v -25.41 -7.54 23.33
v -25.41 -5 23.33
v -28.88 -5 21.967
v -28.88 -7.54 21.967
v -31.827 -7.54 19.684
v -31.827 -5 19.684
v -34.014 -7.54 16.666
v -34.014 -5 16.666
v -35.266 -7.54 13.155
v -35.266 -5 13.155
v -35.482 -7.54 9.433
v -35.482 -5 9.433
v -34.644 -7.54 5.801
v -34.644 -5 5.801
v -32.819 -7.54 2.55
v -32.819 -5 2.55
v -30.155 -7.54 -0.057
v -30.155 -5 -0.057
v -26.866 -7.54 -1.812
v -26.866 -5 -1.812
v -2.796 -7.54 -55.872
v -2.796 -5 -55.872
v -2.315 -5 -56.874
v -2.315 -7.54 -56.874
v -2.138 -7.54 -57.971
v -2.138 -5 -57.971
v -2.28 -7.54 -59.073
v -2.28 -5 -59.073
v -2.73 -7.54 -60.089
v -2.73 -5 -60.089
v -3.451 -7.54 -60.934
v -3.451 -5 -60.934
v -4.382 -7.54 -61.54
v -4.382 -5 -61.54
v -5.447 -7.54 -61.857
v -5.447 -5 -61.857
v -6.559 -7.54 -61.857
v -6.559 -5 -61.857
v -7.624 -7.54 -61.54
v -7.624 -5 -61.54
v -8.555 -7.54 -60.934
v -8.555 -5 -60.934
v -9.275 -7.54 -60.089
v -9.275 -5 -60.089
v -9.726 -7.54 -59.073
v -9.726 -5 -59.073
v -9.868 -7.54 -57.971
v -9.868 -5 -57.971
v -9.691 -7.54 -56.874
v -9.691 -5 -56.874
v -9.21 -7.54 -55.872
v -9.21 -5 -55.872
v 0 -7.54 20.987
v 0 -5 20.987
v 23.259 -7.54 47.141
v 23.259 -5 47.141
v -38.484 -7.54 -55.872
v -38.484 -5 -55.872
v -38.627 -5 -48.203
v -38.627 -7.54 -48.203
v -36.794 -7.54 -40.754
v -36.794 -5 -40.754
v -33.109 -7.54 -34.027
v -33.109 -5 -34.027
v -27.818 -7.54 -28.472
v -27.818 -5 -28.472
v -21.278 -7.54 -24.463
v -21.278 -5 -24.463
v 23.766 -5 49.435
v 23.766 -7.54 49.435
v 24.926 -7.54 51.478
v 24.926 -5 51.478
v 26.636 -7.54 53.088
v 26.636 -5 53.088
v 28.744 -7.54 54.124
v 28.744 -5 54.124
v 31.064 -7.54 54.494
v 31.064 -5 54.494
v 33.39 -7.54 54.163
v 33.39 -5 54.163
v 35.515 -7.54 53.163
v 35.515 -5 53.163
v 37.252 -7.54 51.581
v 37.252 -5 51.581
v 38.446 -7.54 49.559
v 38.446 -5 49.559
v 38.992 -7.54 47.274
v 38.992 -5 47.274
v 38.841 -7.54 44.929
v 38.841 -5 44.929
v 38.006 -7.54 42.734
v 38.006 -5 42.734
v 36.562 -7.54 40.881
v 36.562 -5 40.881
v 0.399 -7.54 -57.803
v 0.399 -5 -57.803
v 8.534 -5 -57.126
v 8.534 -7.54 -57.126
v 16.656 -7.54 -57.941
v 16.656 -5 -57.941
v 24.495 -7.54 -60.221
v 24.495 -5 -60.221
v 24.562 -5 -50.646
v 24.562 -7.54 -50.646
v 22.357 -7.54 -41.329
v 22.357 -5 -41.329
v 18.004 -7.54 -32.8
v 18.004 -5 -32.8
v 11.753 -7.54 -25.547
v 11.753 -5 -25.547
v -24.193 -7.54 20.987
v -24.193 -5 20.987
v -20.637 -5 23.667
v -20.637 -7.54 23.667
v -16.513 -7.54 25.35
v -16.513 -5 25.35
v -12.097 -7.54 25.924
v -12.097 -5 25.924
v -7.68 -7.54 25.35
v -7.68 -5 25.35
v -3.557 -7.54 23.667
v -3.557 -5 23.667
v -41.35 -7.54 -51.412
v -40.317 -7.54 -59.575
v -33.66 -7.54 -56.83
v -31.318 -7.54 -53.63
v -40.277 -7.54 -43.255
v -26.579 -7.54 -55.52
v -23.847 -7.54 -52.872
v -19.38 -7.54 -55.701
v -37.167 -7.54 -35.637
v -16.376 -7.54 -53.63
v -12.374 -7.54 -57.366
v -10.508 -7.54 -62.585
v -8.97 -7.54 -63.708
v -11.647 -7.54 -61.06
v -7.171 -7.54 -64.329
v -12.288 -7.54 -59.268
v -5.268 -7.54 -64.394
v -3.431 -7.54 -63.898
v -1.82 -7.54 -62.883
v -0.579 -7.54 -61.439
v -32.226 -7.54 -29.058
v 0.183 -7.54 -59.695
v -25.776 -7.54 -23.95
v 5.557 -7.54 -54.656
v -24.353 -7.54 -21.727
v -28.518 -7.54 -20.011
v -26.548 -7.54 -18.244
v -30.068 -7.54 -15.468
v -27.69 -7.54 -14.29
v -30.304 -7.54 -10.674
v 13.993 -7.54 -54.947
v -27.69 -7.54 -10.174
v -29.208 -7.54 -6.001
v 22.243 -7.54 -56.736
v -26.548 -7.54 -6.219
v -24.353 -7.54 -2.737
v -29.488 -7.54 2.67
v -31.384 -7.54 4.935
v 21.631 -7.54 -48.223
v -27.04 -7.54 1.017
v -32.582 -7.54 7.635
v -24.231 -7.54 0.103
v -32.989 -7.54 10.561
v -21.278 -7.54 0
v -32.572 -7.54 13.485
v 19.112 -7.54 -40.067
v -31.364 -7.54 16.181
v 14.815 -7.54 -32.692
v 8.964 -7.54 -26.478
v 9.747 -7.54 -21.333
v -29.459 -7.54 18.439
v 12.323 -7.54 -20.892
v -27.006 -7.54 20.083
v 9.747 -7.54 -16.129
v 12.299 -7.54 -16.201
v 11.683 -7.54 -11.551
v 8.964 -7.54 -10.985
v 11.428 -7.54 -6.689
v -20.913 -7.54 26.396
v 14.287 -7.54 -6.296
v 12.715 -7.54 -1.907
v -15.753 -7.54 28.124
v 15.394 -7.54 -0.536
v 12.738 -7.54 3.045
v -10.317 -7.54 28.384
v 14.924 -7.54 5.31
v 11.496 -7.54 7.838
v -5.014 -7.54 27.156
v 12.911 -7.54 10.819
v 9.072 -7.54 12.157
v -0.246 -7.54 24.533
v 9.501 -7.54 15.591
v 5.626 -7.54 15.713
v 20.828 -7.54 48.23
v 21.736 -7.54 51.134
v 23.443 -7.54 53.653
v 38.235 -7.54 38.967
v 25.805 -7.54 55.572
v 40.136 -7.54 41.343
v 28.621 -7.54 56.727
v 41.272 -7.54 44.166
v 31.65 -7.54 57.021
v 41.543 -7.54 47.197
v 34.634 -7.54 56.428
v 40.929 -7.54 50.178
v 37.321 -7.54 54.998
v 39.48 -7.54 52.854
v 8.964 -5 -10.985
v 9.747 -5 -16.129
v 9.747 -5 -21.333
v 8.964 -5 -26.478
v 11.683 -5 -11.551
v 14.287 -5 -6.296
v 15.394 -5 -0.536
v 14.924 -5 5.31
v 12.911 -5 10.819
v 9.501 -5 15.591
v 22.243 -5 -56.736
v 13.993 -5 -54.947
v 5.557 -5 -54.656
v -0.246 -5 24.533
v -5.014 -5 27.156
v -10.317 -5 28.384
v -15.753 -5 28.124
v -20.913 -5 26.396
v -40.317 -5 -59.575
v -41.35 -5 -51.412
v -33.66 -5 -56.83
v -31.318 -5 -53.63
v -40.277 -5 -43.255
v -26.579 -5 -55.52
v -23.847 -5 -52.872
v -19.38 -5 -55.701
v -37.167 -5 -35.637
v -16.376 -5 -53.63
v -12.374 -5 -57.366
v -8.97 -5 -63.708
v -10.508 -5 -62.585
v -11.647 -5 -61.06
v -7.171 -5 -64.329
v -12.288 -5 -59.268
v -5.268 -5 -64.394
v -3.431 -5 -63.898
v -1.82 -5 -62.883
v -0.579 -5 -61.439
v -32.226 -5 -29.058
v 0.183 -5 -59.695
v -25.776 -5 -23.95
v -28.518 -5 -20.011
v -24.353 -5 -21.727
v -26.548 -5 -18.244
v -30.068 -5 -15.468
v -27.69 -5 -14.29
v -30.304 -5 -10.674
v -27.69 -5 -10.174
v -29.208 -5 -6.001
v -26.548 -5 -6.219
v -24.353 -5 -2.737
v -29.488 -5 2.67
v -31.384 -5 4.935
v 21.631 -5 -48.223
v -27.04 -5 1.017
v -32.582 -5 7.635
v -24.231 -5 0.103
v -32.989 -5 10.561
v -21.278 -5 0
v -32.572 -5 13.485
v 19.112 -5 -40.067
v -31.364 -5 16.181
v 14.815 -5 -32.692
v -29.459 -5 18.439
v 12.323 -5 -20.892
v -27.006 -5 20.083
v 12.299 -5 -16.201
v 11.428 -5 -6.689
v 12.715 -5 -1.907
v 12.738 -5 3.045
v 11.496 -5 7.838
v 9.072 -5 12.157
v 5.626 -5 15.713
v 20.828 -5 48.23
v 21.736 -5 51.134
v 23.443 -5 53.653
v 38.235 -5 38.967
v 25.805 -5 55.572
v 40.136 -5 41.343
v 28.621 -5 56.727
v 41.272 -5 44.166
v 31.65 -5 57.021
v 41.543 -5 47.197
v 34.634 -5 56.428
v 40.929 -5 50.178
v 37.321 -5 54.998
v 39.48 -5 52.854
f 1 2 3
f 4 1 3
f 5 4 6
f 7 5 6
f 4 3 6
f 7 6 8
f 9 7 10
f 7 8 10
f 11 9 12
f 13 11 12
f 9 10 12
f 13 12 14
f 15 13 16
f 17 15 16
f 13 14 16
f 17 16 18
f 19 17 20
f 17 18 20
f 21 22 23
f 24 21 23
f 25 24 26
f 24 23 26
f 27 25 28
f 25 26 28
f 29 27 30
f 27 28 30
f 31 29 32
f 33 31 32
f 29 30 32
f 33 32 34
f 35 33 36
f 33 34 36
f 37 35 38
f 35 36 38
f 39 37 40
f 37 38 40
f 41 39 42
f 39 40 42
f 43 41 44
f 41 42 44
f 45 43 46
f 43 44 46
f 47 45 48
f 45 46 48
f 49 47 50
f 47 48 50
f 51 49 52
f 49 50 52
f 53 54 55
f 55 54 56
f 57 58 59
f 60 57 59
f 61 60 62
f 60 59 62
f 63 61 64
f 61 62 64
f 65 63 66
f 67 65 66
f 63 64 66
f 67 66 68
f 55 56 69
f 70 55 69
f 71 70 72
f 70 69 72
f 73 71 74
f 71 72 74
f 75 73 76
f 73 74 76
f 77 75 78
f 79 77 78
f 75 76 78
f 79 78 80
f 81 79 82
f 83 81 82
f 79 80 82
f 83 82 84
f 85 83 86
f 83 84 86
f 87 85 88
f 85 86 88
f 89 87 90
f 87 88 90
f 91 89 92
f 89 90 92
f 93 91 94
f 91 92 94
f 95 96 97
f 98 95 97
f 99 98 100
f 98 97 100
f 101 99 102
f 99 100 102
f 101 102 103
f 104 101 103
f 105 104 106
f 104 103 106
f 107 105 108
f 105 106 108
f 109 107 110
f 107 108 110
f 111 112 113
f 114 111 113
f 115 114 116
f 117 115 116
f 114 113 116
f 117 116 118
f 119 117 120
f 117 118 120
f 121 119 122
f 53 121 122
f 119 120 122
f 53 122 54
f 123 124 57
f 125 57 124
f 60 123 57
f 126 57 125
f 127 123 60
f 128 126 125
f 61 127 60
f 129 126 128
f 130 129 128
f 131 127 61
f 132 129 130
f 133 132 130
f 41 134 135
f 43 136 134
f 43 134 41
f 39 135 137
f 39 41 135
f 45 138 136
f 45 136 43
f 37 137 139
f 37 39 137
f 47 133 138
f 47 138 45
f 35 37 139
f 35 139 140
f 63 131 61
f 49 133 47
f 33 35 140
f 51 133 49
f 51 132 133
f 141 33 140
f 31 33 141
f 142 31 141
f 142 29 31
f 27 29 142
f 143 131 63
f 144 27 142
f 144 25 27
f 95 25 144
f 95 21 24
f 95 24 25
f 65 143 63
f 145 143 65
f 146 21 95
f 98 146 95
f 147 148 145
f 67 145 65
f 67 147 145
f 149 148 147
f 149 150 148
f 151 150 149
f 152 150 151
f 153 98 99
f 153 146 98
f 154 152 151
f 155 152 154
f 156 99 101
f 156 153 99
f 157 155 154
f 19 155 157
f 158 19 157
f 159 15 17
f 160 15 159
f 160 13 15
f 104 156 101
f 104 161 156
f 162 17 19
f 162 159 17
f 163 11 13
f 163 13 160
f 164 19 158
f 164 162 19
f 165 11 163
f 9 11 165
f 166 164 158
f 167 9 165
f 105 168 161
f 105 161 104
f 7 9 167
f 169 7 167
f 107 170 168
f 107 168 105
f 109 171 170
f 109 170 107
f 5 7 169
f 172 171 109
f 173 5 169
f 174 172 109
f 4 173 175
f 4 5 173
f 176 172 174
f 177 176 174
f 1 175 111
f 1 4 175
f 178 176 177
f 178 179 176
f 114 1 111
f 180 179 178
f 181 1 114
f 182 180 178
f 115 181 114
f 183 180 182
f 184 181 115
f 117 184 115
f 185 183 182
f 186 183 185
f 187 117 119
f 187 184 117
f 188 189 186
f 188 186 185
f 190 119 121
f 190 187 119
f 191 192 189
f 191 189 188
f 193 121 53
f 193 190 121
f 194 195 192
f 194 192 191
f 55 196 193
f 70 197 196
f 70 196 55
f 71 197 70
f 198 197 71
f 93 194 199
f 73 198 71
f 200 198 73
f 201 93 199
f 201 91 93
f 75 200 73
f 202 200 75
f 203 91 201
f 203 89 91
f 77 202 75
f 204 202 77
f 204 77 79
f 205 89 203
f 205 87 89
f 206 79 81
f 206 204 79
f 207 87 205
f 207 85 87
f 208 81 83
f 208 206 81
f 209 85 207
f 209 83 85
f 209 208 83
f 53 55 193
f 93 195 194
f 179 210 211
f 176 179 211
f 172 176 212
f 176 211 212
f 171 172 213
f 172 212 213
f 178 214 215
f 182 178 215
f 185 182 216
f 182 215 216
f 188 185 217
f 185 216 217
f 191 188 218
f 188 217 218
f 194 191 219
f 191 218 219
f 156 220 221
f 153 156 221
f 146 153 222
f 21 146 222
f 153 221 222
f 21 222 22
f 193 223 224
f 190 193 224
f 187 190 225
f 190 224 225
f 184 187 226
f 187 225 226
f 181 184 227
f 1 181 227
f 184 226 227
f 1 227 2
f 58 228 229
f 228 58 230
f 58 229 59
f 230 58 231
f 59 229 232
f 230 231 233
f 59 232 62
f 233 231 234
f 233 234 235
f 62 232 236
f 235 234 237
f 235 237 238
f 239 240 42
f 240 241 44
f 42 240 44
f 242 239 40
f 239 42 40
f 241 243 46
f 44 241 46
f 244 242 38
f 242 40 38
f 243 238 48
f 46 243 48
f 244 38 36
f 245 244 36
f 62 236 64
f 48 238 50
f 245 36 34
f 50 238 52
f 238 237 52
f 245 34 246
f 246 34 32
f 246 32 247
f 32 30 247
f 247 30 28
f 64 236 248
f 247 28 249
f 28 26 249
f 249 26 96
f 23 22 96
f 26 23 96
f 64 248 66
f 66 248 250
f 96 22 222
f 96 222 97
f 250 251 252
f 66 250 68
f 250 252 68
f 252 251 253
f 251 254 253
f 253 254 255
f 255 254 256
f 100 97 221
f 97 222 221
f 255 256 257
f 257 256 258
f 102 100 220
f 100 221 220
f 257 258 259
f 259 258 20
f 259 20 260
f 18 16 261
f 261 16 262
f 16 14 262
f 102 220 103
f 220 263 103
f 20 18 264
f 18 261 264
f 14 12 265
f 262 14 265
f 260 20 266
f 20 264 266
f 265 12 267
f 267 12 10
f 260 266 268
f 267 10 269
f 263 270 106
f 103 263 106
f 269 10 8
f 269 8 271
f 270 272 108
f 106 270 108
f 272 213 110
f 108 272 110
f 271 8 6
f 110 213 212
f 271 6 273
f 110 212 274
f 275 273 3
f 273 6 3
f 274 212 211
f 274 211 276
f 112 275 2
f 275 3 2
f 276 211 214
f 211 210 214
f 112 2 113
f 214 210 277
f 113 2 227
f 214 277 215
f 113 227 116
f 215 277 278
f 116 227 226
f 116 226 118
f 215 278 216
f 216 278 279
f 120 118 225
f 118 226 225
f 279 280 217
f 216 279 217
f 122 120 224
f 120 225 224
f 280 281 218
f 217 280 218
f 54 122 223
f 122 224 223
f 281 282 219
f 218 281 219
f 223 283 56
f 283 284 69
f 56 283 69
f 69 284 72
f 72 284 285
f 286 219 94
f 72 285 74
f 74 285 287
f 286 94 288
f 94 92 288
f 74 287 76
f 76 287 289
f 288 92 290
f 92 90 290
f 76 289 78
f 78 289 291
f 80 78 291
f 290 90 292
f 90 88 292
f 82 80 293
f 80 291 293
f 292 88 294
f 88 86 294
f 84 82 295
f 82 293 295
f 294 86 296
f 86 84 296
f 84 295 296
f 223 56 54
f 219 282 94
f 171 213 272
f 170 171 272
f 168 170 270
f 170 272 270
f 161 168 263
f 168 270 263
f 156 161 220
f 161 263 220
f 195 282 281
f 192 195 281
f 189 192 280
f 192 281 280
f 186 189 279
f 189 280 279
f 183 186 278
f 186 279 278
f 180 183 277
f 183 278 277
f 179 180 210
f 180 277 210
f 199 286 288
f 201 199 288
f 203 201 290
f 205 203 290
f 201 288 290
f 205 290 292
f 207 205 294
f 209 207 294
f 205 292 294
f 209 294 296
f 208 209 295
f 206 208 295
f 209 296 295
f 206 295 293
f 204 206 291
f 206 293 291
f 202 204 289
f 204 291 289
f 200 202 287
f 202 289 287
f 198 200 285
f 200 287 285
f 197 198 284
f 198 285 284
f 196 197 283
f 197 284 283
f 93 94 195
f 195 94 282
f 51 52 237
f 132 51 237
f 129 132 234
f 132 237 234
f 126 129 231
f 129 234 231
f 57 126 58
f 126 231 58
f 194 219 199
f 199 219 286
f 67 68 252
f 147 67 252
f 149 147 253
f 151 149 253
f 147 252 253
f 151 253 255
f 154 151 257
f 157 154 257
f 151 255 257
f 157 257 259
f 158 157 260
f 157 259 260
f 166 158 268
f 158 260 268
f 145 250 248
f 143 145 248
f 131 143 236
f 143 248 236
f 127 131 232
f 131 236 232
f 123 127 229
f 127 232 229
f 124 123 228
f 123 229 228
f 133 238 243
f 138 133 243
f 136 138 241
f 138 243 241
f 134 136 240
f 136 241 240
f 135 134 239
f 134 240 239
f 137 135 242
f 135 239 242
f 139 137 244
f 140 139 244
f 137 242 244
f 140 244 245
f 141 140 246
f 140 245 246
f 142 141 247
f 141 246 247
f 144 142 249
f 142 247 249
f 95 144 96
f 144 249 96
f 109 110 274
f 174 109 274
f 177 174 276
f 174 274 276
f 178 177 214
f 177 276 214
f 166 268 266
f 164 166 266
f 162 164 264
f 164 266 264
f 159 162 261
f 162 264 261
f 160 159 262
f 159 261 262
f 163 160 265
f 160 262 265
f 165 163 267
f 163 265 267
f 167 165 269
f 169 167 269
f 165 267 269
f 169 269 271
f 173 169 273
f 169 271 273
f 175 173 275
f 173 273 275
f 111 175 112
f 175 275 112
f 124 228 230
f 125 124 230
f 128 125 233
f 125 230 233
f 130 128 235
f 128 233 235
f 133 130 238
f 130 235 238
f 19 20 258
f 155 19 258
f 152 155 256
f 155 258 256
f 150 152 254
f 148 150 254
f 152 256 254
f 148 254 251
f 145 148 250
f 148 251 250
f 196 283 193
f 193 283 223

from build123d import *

# Parameters (mm, degrees)
F1_DEPTH = 5
F4_DEPTH = 2.54
F5_DEPTH = 25.4


with BuildPart() as f1:
    # F0 (on Front) → F1 (new body)
    with BuildSketch(Plane.XZ):
        with BuildLine():
            ThreePointArc((0, 20.9869445181), (-12.0966427586, 25.9236544676), (-24.1932855172, 20.9869445181))
            ThreePointArc((-24.1932855172, 20.9869445181), (-32.8877742223, 9.0834832543), (-21.2784307494, 0))
            ThreePointArc((-21.2784307494, 0), (-27.8345018972, -12.2317448258), (-21.2784307494, -24.4634896517))
            ThreePointArc((-21.2784307494, -24.4634896517), (-35.1701421662, -37.2707710413), (-38.4840406477, -55.8724962175))
            ThreePointArc((-38.4840406477, -55.8724962175), (-23.8469055846, -52.8720513548), (-9.2097705214, -55.8724962175))
            ThreePointArc((-9.2097705214, -55.8724962175), (-6.0029489911, -61.8966557159), (-2.7961274609, -55.8724962175))
            ThreePointArc((-2.7961274609, -55.8724962175), (9.7817579313, -54.6124723986), (22.2429726273, -56.7359104753))
            ThreePointArc((22.2429726273, -56.7359104753), (22.2759376745, -54.9746026101), (22.22623583, -53.2136875591))
            ThreePointArc((22.22623583, -53.2136875591), (18.366243738, -38.4713383456), (8.9641526372, -26.4781285077))
            ThreePointArc((8.9641526372, -26.4781285077), (9.8457214763, -18.7313808571), (8.9641526372, -10.9846332065))
            ThreePointArc((8.9641526372, -10.9846332065), (12.7377833841, 3.0446666193), (5.6262267365, 15.7130250237))
            Line((5.6262267365, 15.7130250237), (36.5616049228, 40.8807976003))
            ThreePointArc((36.5616049228, 40.8807976003), (34.4898748978, 53.7428757551), (23.25864156, 47.1410186325))
            Line((23.25864156, 47.1410186325), (0, 20.9869445181))
        make_face()
    extrude(amount=F1_DEPTH)

    # F5 (cut): a face of the model
    f5_faces = [f1.faces().sort_by_distance(p)[0] for p in [
        (-4.5967380367, -5, -11.98241047),
    ]]
    extrude(f5_faces, amount=-F5_DEPTH, mode=Mode.SUBTRACT)


with BuildPart() as f1b:
    # F0 (on Front) → F1, piece 2 (new body)
    with BuildSketch(Plane.XZ):
        with BuildLine():
            ThreePointArc((41.8436169818, -52.7066290379), (31.7747593943, -42.8946624715), (22.22623583, -53.2136875591))
            ThreePointArc((22.22623583, -53.2136875591), (32.2819872673, -62.5185956042), (41.8436169818, -52.7066290379))
        make_face()
    extrude(amount=F1_DEPTH)


with BuildPart() as f4:
    # F3 (on face) → F4 (new body)
    with BuildSketch(Plane.XZ.offset(5)):
        with BuildLine():
            ThreePointArc((-40.3169446951, -59.5749264298), (-26.5786982557, -55.5198668281), (-12.3739342893, -57.3658365623))
            ThreePointArc((-12.3739342893, -57.3658365623), (-6.2221601499, -64.4329037682), (0.3986158134, -57.8031911351))
            ThreePointArc((0.3986158134, -57.8031911351), (12.6136445695, -57.3475459696), (24.4946623983, -60.2208638043))
            ThreePointArc((24.4946623983, -60.2208638043), (22.3566756727, -41.3285471938), (11.7528280148, -25.5472598891))
            ThreePointArc((11.7528280148, -25.5472598891), (12.3852570181, -18.5459373039), (11.6827134618, -11.5513024358))
            ThreePointArc((11.6827134618, -11.5513024358), (15.3563975367, 2.4028081974), (9.5009837393, 15.5909577077))
            Line((9.5009837393, 15.5909577077), (38.2345170044, 38.9673983055))
            ThreePointArc((38.2345170044, 38.9673983055), (36.0298866682, 55.8114240261), (20.82786015, 48.229868306))
            Line((20.82786015, 48.229868306), (-0.2458838852, 24.5326862524))
            ThreePointArc((-0.2458838852, 24.5326862524), (-13.043561552, 28.4410317154), (-25.4100113891, 23.3296095701))
            ThreePointArc((-25.4100113891, 23.3296095701), (-35.5065684593, 11.3015480777), (-26.8662872673, -1.811814148))
            ThreePointArc((-26.8662872673, -1.811814148), (-30.3536378615, -13.0793756448), (-25.7757993219, -23.9496539557))
            ThreePointArc((-25.7757993219, -23.9496539557), (-38.9666786297, -39.3458023105), (-40.3169446951, -59.5749264298))
        make_face()
        with BuildLine():
            ThreePointArc((-2.7961274609, -55.8724962175), (-6.0029489911, -61.8966557159), (-9.2097705214, -55.8724962175))
            ThreePointArc((-9.2097705214, -55.8724962175), (-23.8469055846, -52.8720513548), (-38.4840406477, -55.8724962175))
            ThreePointArc((-38.4840406477, -55.8724962175), (-35.1701421662, -37.2707710413), (-21.2784307494, -24.4634896517))
            ThreePointArc((-21.2784307494, -24.4634896517), (-27.8345018972, -12.2317448258), (-21.2784307494, 0))
            ThreePointArc((-21.2784307494, 0), (-32.8877742223, 9.0834832543), (-24.1932855172, 20.9869445181))
            ThreePointArc((-24.1932855172, 20.9869445181), (-12.0966427586, 25.9236544676), (0, 20.9869445181))
            Line((0, 20.9869445181), (23.25864156, 47.1410186325))
            ThreePointArc((23.25864156, 47.1410186325), (34.4898748978, 53.7428757551), (36.5616049228, 40.8807976003))
            Line((36.5616049228, 40.8807976003), (5.6262267365, 15.7130250237))
            ThreePointArc((5.6262267365, 15.7130250237), (12.7377833841, 3.0446666193), (8.9641526372, -10.9846332065))
            ThreePointArc((8.9641526372, -10.9846332065), (9.8457214763, -18.7313808571), (8.9641526372, -26.4781285077))
            ThreePointArc((8.9641526372, -26.4781285077), (19.1118233272, -40.0673969806), (22.2429726273, -56.7359104753))
            ThreePointArc((22.2429726273, -56.7359104753), (9.7817579313, -54.6124723986), (-2.7961274609, -55.8724962175))
        make_face(mode=Mode.SUBTRACT)
    extrude(amount=F4_DEPTH)


solid = f4.part
